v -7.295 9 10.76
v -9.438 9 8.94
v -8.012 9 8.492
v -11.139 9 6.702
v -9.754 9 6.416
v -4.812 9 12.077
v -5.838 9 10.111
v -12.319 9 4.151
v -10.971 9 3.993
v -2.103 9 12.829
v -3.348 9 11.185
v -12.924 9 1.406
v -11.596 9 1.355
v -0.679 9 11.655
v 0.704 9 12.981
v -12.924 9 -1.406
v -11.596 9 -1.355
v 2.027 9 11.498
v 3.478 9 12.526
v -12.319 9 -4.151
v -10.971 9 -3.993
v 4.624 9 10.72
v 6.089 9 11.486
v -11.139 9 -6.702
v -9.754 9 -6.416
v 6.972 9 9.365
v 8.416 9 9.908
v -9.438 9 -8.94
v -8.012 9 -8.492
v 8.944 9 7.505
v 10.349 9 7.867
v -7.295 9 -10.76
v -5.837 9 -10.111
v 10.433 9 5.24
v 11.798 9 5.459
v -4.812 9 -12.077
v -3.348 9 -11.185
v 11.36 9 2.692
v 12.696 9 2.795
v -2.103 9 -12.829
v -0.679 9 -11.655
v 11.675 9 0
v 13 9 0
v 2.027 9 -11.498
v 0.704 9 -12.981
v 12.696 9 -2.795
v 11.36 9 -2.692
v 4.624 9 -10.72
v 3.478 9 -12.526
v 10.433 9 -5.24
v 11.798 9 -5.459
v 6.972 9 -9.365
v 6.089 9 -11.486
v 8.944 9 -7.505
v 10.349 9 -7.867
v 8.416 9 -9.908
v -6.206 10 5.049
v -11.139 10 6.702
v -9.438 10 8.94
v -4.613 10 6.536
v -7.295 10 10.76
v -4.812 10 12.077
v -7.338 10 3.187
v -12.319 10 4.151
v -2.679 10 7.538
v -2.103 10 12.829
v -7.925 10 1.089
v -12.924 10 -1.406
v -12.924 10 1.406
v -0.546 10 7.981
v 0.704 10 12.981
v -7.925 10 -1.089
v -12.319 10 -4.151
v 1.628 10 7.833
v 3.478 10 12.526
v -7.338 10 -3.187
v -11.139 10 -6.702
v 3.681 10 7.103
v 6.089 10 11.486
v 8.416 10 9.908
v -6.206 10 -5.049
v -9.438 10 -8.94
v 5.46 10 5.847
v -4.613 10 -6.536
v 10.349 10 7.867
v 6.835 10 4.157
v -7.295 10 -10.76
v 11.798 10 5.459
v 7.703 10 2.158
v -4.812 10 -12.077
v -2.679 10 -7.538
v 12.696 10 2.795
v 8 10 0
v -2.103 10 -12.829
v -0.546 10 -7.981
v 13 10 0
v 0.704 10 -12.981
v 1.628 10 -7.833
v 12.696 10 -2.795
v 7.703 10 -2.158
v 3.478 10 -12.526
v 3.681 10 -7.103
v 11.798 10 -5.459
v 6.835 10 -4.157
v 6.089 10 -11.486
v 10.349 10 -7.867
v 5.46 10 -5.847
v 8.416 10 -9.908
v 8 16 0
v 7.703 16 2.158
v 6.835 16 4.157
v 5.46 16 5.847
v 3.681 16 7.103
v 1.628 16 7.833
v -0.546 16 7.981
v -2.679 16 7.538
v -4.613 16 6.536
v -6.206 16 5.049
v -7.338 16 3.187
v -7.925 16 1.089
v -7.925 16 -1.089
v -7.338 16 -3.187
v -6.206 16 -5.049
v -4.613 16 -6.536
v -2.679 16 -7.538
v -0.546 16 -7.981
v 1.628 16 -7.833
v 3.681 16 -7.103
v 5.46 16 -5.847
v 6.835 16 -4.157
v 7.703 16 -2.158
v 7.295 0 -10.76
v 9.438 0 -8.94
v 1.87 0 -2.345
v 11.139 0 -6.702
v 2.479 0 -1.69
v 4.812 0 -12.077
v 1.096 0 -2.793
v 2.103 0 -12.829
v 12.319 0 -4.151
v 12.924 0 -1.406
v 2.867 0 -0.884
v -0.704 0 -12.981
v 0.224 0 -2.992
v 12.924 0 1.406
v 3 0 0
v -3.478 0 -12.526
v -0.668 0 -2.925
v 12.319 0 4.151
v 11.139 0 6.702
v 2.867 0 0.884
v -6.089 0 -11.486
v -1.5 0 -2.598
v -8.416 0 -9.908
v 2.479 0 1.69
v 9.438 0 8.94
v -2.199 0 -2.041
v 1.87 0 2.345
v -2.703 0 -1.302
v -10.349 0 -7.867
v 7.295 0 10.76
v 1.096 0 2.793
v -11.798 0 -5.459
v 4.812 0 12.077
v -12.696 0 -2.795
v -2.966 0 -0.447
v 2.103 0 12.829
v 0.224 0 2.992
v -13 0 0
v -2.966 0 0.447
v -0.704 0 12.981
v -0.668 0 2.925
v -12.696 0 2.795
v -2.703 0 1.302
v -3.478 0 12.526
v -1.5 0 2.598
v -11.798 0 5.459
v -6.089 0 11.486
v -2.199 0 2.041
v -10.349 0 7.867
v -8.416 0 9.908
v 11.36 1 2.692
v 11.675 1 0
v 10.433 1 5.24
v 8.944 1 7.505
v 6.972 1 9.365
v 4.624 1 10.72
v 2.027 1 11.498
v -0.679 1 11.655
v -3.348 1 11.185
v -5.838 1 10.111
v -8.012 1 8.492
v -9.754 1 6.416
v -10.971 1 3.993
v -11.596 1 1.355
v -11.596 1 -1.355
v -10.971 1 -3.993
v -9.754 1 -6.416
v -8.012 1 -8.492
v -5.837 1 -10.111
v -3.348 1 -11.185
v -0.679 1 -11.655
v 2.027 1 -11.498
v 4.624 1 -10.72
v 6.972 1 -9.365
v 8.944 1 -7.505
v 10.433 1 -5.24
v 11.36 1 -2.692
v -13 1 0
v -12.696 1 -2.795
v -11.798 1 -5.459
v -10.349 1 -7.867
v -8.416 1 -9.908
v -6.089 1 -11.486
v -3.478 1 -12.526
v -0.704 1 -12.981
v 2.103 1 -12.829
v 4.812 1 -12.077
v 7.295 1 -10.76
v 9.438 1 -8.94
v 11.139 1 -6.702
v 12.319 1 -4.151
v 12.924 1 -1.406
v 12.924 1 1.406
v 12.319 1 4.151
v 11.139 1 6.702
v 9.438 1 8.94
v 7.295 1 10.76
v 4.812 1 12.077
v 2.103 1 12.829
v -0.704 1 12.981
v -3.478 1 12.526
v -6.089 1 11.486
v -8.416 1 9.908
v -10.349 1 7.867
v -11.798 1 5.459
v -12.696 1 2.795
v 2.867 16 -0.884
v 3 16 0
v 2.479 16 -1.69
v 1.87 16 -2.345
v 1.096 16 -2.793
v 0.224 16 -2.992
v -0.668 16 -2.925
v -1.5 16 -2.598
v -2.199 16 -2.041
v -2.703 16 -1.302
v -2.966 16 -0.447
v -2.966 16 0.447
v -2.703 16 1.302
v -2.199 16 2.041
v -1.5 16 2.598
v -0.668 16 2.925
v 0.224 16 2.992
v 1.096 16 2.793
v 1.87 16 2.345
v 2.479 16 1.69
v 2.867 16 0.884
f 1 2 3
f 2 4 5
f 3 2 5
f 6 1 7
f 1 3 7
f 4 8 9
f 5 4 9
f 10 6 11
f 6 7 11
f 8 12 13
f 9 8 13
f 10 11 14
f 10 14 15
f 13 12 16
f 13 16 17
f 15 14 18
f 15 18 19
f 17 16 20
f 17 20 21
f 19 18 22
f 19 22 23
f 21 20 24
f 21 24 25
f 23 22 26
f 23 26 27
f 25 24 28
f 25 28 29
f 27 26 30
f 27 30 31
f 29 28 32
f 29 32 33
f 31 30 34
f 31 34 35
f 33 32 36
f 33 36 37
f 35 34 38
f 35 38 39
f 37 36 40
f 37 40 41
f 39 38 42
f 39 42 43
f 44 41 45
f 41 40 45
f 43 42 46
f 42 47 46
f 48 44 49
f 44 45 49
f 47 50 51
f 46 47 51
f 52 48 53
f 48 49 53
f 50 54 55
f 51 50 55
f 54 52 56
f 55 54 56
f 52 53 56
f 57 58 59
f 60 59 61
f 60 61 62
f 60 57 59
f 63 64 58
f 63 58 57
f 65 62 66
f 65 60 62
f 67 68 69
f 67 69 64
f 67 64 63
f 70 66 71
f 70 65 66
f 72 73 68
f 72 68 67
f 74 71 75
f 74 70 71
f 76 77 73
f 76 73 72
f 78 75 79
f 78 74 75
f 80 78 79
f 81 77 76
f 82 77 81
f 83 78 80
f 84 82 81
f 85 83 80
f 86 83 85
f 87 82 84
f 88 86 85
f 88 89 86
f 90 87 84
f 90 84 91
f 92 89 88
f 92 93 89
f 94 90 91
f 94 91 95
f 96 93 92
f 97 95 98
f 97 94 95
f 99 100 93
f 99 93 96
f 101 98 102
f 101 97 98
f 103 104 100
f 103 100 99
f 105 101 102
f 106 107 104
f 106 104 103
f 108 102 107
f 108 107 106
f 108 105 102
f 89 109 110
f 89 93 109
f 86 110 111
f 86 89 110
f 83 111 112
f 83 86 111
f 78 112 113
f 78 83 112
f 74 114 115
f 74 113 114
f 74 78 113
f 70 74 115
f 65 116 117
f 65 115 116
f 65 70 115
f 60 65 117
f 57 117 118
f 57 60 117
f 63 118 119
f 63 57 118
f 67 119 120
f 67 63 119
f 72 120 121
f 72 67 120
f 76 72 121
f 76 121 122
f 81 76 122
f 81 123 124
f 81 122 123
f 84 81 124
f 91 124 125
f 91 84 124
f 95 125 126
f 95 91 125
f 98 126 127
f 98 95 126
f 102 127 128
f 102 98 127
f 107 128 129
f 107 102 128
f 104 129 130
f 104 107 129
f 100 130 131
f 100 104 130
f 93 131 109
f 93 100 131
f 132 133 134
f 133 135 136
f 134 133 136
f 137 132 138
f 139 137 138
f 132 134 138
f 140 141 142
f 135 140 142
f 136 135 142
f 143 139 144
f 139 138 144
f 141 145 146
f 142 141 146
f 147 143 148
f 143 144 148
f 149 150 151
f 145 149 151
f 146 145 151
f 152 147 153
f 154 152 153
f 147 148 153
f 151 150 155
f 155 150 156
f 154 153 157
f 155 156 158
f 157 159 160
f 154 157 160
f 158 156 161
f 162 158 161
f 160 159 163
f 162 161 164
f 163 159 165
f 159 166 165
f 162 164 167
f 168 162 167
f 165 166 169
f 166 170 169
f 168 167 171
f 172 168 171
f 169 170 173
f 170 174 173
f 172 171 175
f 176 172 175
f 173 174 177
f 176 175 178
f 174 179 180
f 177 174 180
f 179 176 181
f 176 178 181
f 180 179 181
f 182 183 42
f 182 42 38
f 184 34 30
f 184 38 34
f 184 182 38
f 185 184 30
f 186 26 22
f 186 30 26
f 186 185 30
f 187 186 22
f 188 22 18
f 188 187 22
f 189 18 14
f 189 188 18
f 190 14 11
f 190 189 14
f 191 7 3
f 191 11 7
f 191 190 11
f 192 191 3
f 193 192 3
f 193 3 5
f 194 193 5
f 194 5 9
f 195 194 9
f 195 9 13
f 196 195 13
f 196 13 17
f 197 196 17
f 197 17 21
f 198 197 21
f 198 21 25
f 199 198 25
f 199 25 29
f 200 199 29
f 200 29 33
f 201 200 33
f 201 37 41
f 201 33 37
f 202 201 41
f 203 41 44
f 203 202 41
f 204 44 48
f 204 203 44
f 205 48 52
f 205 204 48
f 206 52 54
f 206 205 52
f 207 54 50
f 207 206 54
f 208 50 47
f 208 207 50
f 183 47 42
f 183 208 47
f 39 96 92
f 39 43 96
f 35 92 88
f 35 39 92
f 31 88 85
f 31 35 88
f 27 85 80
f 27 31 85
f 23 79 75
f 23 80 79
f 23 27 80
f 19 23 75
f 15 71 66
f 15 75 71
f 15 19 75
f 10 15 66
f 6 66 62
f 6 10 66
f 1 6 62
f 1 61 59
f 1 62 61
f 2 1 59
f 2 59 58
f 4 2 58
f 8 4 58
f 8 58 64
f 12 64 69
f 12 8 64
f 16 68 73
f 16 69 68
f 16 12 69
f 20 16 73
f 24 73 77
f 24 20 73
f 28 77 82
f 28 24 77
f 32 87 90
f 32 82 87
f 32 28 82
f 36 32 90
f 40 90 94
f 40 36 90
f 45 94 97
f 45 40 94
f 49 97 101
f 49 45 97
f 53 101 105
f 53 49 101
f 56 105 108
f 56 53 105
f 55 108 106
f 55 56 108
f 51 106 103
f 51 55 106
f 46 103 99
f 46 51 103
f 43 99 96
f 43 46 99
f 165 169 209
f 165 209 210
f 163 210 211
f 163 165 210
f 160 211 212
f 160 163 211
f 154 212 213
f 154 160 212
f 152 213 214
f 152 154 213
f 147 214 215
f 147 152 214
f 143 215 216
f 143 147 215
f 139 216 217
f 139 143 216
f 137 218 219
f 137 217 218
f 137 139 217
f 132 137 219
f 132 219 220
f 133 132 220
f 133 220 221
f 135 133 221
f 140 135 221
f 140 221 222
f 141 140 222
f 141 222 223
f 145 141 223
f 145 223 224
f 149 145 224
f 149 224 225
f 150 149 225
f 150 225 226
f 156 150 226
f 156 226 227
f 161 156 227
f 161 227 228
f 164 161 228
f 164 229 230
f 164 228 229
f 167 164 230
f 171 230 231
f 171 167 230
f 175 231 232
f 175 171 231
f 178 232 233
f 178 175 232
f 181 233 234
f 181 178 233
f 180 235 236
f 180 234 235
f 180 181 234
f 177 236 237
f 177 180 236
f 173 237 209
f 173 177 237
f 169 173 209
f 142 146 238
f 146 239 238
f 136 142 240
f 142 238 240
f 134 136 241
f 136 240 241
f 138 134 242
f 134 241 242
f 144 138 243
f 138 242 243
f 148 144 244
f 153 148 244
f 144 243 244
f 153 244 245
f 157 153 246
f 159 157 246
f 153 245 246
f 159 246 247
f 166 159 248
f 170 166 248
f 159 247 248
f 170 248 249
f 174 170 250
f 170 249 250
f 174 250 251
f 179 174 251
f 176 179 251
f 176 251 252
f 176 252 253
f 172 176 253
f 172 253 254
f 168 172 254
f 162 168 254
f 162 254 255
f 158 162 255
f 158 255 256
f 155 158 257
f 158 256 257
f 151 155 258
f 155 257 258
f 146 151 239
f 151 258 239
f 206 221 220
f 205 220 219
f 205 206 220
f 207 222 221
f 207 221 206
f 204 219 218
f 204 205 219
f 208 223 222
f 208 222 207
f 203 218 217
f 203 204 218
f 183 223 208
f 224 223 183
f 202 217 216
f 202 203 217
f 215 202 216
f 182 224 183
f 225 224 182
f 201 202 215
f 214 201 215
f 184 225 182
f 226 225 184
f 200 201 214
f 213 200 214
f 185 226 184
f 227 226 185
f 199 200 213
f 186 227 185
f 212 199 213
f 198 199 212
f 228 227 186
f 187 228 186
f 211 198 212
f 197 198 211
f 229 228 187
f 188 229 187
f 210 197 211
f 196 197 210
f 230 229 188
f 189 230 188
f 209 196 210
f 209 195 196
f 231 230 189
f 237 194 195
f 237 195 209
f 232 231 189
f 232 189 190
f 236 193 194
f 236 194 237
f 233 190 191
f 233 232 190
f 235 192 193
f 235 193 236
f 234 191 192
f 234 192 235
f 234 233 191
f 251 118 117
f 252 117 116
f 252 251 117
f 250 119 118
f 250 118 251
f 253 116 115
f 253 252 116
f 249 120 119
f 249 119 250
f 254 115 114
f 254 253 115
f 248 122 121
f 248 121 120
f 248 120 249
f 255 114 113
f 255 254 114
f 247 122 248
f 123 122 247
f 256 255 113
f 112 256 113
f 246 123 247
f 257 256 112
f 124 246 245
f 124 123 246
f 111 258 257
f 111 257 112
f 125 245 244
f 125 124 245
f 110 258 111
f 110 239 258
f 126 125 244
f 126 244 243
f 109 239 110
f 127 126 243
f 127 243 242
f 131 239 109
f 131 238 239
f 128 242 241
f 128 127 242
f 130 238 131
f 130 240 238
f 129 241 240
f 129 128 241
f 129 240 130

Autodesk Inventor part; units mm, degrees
ref_plane "YZ Plane" through (0, 0, 0) normal (1, 0, 0) x (0, 1, 0)
ref_plane "XZ Plane" through (0, 0, 0) normal (0, 1, 0) x (-1, 0, 0)
ref_plane "XY Plane" through (0, 0, 0) normal (0, 0, 1) x (1, 0, 0)
sketch "Esquisse1" plane through (0, 0, 0) normal (0, 1, 0) x (-1, 0, 0)
  circle A0 centre (0, 0) radius 13
  dimension "d0" = 26
extrude "Extrusion1" add sketch "Esquisse1" along normal blind 1
sketch "Esquisse2" plane through (0, 1, 0) normal (0, 1, 0) x (1, 0, 0)
  circle A0 centre (0, 0) radius 13 projected
  circle A1 centre (0, 0) radius 11.675
  dimension "d3" = 23.35
extrude "Extrusion2" add sketch "Esquisse2" along normal blind 8 contours A1
sketch "Esquisse3" plane through (0, 9, 0) normal (0, 1, 0) x (1, 0, 0)
  circle A0 centre (0, 0) radius 11.675 projected
  circle A1 centre (0, 0) radius 13
  dimension "d6" = 26
extrude "Extrusion3" add sketch "Esquisse3" along normal blind 1 contours A0 | A1
sketch "Esquisse4" plane through (0, 10, 0) normal (0, 1, 0) x (1, 0, 0)
  circle A0 centre (0, 0) radius 13 projected
  circle A1 centre (0, 0) radius 8
  dimension "d9" = 16
extrude "Extrusion4" add sketch "Esquisse4" along normal blind 6 contours A1
sketch "Esquisse5" plane through (0, 16, 0) normal (0, 1, 0) x (1, 0, 0)
  circle A0 centre (0, 0) radius 8 projected
  circle A1 centre (0, 0) radius 3
  dimension "d12" = 6
extrude "Extrusion5" cut sketch "Esquisse5" against normal through all contours A1
properties part number "poulie_conrad_209515"
